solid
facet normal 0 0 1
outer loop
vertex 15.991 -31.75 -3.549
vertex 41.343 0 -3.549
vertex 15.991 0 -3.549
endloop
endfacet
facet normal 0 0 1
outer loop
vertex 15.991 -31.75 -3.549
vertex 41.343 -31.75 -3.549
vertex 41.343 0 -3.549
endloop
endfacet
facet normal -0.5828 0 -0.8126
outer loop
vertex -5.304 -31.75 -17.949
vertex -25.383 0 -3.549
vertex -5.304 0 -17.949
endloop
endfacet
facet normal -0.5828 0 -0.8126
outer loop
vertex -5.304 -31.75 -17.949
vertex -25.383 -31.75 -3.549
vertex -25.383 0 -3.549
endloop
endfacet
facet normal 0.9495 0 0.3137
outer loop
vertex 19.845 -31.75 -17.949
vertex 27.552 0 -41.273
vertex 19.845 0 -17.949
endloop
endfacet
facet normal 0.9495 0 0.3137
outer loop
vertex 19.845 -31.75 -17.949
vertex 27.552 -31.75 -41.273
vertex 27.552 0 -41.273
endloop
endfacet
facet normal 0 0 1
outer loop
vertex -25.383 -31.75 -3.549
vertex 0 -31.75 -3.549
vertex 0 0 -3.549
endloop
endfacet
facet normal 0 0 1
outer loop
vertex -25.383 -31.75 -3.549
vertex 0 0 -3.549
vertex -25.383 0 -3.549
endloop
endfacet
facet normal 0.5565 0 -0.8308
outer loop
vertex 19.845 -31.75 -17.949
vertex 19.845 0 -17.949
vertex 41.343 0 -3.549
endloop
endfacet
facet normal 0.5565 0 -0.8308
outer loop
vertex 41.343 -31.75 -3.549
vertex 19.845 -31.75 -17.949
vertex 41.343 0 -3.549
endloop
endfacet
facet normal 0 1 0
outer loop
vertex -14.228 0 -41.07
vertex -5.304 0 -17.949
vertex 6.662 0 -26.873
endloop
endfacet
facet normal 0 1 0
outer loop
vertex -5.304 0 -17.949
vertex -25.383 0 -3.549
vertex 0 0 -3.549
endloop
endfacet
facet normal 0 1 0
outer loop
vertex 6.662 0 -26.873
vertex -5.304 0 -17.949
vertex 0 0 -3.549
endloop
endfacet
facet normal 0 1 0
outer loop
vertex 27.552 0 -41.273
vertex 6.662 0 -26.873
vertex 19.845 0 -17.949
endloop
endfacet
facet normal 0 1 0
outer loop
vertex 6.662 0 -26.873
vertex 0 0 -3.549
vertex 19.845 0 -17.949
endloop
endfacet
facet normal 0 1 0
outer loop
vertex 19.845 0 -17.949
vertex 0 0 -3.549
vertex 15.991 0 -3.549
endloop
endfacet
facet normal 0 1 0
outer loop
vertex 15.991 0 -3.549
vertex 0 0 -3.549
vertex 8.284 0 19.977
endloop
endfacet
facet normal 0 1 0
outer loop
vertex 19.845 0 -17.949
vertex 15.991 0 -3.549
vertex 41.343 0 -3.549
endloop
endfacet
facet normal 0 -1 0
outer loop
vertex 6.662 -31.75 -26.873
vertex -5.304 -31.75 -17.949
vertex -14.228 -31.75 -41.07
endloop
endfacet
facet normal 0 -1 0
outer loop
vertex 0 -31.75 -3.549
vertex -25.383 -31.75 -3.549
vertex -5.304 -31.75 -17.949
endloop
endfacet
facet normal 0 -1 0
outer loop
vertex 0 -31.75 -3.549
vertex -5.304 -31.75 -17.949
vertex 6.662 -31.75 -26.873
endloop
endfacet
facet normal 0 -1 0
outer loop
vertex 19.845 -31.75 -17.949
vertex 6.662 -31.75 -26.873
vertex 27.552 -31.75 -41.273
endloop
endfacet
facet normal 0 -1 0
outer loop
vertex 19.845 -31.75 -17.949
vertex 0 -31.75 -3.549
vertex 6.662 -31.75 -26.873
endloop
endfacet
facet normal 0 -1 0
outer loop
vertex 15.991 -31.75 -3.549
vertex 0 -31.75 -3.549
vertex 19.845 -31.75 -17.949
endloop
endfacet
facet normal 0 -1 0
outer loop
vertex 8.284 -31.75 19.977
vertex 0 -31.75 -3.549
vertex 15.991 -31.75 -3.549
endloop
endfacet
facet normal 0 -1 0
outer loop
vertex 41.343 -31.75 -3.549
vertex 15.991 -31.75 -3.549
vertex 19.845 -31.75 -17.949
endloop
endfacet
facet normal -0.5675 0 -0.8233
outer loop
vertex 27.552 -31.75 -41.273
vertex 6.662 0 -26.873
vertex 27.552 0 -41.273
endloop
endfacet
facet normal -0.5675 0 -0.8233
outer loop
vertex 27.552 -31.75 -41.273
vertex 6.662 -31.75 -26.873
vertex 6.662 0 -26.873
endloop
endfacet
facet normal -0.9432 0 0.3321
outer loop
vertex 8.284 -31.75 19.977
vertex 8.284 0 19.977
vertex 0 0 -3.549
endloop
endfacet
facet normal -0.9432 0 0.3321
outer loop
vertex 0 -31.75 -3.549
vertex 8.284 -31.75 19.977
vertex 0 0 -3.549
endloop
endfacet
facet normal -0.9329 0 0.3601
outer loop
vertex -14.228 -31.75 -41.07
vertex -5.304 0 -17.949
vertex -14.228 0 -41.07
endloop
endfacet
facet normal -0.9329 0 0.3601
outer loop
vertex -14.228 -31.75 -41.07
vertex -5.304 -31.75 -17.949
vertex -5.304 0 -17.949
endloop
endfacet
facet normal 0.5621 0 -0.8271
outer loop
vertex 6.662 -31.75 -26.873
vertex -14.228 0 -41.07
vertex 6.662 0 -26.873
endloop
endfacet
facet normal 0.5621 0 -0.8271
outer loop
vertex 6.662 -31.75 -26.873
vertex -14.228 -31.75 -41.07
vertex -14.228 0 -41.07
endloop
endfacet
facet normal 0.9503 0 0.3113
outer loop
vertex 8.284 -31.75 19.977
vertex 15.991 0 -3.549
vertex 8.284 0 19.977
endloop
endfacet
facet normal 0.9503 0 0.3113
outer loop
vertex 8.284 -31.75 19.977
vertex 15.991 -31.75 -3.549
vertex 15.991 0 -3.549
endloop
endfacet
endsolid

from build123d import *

# Parameters (mm, degrees)
F0_W     = 94.5225581527
F0_H     = 71.0351280868
F1_DEPTH = 25.4
F3_DEPTH = 6.35
F4_DEPTH = 25.4


with BuildPart() as f1:
    # F0 (on Front) → F1 (new body)
    with BuildSketch(Plane.XZ):
        with Locations((6.3969828188, -10.8844134957)):
            Rectangle(F0_W, F0_H)
    extrude(amount=F1_DEPTH)

    # F2 (on face) → F3 (join)
    with BuildSketch(Plane.XZ.offset(25.4)):
        Polygon((0, -3.5492395982), (-25.3826901317, -3.5492395982), (-5.3041339852, -17.9490111768), (-14.2279369757, -41.0697720945), (6.6618728451, -26.8728137016), (27.5516826659, -41.2725880742), (19.8447629809, -17.9490111768), (41.3430146873, -3.5492395982), (15.9913022071, -3.5492395982), (8.2843825221, 19.9771486223), align=None)
    extrude(amount=F3_DEPTH)

    # F4 (cut): a face of the model
    f4_faces = [f1.faces().sort_by_distance(p)[0] for p in [
        (6.3969828188, -25.4, 23.450758759),
    ]]
    extrude(f4_faces, amount=-F4_DEPTH, mode=Mode.SUBTRACT)


solid = f1.part
